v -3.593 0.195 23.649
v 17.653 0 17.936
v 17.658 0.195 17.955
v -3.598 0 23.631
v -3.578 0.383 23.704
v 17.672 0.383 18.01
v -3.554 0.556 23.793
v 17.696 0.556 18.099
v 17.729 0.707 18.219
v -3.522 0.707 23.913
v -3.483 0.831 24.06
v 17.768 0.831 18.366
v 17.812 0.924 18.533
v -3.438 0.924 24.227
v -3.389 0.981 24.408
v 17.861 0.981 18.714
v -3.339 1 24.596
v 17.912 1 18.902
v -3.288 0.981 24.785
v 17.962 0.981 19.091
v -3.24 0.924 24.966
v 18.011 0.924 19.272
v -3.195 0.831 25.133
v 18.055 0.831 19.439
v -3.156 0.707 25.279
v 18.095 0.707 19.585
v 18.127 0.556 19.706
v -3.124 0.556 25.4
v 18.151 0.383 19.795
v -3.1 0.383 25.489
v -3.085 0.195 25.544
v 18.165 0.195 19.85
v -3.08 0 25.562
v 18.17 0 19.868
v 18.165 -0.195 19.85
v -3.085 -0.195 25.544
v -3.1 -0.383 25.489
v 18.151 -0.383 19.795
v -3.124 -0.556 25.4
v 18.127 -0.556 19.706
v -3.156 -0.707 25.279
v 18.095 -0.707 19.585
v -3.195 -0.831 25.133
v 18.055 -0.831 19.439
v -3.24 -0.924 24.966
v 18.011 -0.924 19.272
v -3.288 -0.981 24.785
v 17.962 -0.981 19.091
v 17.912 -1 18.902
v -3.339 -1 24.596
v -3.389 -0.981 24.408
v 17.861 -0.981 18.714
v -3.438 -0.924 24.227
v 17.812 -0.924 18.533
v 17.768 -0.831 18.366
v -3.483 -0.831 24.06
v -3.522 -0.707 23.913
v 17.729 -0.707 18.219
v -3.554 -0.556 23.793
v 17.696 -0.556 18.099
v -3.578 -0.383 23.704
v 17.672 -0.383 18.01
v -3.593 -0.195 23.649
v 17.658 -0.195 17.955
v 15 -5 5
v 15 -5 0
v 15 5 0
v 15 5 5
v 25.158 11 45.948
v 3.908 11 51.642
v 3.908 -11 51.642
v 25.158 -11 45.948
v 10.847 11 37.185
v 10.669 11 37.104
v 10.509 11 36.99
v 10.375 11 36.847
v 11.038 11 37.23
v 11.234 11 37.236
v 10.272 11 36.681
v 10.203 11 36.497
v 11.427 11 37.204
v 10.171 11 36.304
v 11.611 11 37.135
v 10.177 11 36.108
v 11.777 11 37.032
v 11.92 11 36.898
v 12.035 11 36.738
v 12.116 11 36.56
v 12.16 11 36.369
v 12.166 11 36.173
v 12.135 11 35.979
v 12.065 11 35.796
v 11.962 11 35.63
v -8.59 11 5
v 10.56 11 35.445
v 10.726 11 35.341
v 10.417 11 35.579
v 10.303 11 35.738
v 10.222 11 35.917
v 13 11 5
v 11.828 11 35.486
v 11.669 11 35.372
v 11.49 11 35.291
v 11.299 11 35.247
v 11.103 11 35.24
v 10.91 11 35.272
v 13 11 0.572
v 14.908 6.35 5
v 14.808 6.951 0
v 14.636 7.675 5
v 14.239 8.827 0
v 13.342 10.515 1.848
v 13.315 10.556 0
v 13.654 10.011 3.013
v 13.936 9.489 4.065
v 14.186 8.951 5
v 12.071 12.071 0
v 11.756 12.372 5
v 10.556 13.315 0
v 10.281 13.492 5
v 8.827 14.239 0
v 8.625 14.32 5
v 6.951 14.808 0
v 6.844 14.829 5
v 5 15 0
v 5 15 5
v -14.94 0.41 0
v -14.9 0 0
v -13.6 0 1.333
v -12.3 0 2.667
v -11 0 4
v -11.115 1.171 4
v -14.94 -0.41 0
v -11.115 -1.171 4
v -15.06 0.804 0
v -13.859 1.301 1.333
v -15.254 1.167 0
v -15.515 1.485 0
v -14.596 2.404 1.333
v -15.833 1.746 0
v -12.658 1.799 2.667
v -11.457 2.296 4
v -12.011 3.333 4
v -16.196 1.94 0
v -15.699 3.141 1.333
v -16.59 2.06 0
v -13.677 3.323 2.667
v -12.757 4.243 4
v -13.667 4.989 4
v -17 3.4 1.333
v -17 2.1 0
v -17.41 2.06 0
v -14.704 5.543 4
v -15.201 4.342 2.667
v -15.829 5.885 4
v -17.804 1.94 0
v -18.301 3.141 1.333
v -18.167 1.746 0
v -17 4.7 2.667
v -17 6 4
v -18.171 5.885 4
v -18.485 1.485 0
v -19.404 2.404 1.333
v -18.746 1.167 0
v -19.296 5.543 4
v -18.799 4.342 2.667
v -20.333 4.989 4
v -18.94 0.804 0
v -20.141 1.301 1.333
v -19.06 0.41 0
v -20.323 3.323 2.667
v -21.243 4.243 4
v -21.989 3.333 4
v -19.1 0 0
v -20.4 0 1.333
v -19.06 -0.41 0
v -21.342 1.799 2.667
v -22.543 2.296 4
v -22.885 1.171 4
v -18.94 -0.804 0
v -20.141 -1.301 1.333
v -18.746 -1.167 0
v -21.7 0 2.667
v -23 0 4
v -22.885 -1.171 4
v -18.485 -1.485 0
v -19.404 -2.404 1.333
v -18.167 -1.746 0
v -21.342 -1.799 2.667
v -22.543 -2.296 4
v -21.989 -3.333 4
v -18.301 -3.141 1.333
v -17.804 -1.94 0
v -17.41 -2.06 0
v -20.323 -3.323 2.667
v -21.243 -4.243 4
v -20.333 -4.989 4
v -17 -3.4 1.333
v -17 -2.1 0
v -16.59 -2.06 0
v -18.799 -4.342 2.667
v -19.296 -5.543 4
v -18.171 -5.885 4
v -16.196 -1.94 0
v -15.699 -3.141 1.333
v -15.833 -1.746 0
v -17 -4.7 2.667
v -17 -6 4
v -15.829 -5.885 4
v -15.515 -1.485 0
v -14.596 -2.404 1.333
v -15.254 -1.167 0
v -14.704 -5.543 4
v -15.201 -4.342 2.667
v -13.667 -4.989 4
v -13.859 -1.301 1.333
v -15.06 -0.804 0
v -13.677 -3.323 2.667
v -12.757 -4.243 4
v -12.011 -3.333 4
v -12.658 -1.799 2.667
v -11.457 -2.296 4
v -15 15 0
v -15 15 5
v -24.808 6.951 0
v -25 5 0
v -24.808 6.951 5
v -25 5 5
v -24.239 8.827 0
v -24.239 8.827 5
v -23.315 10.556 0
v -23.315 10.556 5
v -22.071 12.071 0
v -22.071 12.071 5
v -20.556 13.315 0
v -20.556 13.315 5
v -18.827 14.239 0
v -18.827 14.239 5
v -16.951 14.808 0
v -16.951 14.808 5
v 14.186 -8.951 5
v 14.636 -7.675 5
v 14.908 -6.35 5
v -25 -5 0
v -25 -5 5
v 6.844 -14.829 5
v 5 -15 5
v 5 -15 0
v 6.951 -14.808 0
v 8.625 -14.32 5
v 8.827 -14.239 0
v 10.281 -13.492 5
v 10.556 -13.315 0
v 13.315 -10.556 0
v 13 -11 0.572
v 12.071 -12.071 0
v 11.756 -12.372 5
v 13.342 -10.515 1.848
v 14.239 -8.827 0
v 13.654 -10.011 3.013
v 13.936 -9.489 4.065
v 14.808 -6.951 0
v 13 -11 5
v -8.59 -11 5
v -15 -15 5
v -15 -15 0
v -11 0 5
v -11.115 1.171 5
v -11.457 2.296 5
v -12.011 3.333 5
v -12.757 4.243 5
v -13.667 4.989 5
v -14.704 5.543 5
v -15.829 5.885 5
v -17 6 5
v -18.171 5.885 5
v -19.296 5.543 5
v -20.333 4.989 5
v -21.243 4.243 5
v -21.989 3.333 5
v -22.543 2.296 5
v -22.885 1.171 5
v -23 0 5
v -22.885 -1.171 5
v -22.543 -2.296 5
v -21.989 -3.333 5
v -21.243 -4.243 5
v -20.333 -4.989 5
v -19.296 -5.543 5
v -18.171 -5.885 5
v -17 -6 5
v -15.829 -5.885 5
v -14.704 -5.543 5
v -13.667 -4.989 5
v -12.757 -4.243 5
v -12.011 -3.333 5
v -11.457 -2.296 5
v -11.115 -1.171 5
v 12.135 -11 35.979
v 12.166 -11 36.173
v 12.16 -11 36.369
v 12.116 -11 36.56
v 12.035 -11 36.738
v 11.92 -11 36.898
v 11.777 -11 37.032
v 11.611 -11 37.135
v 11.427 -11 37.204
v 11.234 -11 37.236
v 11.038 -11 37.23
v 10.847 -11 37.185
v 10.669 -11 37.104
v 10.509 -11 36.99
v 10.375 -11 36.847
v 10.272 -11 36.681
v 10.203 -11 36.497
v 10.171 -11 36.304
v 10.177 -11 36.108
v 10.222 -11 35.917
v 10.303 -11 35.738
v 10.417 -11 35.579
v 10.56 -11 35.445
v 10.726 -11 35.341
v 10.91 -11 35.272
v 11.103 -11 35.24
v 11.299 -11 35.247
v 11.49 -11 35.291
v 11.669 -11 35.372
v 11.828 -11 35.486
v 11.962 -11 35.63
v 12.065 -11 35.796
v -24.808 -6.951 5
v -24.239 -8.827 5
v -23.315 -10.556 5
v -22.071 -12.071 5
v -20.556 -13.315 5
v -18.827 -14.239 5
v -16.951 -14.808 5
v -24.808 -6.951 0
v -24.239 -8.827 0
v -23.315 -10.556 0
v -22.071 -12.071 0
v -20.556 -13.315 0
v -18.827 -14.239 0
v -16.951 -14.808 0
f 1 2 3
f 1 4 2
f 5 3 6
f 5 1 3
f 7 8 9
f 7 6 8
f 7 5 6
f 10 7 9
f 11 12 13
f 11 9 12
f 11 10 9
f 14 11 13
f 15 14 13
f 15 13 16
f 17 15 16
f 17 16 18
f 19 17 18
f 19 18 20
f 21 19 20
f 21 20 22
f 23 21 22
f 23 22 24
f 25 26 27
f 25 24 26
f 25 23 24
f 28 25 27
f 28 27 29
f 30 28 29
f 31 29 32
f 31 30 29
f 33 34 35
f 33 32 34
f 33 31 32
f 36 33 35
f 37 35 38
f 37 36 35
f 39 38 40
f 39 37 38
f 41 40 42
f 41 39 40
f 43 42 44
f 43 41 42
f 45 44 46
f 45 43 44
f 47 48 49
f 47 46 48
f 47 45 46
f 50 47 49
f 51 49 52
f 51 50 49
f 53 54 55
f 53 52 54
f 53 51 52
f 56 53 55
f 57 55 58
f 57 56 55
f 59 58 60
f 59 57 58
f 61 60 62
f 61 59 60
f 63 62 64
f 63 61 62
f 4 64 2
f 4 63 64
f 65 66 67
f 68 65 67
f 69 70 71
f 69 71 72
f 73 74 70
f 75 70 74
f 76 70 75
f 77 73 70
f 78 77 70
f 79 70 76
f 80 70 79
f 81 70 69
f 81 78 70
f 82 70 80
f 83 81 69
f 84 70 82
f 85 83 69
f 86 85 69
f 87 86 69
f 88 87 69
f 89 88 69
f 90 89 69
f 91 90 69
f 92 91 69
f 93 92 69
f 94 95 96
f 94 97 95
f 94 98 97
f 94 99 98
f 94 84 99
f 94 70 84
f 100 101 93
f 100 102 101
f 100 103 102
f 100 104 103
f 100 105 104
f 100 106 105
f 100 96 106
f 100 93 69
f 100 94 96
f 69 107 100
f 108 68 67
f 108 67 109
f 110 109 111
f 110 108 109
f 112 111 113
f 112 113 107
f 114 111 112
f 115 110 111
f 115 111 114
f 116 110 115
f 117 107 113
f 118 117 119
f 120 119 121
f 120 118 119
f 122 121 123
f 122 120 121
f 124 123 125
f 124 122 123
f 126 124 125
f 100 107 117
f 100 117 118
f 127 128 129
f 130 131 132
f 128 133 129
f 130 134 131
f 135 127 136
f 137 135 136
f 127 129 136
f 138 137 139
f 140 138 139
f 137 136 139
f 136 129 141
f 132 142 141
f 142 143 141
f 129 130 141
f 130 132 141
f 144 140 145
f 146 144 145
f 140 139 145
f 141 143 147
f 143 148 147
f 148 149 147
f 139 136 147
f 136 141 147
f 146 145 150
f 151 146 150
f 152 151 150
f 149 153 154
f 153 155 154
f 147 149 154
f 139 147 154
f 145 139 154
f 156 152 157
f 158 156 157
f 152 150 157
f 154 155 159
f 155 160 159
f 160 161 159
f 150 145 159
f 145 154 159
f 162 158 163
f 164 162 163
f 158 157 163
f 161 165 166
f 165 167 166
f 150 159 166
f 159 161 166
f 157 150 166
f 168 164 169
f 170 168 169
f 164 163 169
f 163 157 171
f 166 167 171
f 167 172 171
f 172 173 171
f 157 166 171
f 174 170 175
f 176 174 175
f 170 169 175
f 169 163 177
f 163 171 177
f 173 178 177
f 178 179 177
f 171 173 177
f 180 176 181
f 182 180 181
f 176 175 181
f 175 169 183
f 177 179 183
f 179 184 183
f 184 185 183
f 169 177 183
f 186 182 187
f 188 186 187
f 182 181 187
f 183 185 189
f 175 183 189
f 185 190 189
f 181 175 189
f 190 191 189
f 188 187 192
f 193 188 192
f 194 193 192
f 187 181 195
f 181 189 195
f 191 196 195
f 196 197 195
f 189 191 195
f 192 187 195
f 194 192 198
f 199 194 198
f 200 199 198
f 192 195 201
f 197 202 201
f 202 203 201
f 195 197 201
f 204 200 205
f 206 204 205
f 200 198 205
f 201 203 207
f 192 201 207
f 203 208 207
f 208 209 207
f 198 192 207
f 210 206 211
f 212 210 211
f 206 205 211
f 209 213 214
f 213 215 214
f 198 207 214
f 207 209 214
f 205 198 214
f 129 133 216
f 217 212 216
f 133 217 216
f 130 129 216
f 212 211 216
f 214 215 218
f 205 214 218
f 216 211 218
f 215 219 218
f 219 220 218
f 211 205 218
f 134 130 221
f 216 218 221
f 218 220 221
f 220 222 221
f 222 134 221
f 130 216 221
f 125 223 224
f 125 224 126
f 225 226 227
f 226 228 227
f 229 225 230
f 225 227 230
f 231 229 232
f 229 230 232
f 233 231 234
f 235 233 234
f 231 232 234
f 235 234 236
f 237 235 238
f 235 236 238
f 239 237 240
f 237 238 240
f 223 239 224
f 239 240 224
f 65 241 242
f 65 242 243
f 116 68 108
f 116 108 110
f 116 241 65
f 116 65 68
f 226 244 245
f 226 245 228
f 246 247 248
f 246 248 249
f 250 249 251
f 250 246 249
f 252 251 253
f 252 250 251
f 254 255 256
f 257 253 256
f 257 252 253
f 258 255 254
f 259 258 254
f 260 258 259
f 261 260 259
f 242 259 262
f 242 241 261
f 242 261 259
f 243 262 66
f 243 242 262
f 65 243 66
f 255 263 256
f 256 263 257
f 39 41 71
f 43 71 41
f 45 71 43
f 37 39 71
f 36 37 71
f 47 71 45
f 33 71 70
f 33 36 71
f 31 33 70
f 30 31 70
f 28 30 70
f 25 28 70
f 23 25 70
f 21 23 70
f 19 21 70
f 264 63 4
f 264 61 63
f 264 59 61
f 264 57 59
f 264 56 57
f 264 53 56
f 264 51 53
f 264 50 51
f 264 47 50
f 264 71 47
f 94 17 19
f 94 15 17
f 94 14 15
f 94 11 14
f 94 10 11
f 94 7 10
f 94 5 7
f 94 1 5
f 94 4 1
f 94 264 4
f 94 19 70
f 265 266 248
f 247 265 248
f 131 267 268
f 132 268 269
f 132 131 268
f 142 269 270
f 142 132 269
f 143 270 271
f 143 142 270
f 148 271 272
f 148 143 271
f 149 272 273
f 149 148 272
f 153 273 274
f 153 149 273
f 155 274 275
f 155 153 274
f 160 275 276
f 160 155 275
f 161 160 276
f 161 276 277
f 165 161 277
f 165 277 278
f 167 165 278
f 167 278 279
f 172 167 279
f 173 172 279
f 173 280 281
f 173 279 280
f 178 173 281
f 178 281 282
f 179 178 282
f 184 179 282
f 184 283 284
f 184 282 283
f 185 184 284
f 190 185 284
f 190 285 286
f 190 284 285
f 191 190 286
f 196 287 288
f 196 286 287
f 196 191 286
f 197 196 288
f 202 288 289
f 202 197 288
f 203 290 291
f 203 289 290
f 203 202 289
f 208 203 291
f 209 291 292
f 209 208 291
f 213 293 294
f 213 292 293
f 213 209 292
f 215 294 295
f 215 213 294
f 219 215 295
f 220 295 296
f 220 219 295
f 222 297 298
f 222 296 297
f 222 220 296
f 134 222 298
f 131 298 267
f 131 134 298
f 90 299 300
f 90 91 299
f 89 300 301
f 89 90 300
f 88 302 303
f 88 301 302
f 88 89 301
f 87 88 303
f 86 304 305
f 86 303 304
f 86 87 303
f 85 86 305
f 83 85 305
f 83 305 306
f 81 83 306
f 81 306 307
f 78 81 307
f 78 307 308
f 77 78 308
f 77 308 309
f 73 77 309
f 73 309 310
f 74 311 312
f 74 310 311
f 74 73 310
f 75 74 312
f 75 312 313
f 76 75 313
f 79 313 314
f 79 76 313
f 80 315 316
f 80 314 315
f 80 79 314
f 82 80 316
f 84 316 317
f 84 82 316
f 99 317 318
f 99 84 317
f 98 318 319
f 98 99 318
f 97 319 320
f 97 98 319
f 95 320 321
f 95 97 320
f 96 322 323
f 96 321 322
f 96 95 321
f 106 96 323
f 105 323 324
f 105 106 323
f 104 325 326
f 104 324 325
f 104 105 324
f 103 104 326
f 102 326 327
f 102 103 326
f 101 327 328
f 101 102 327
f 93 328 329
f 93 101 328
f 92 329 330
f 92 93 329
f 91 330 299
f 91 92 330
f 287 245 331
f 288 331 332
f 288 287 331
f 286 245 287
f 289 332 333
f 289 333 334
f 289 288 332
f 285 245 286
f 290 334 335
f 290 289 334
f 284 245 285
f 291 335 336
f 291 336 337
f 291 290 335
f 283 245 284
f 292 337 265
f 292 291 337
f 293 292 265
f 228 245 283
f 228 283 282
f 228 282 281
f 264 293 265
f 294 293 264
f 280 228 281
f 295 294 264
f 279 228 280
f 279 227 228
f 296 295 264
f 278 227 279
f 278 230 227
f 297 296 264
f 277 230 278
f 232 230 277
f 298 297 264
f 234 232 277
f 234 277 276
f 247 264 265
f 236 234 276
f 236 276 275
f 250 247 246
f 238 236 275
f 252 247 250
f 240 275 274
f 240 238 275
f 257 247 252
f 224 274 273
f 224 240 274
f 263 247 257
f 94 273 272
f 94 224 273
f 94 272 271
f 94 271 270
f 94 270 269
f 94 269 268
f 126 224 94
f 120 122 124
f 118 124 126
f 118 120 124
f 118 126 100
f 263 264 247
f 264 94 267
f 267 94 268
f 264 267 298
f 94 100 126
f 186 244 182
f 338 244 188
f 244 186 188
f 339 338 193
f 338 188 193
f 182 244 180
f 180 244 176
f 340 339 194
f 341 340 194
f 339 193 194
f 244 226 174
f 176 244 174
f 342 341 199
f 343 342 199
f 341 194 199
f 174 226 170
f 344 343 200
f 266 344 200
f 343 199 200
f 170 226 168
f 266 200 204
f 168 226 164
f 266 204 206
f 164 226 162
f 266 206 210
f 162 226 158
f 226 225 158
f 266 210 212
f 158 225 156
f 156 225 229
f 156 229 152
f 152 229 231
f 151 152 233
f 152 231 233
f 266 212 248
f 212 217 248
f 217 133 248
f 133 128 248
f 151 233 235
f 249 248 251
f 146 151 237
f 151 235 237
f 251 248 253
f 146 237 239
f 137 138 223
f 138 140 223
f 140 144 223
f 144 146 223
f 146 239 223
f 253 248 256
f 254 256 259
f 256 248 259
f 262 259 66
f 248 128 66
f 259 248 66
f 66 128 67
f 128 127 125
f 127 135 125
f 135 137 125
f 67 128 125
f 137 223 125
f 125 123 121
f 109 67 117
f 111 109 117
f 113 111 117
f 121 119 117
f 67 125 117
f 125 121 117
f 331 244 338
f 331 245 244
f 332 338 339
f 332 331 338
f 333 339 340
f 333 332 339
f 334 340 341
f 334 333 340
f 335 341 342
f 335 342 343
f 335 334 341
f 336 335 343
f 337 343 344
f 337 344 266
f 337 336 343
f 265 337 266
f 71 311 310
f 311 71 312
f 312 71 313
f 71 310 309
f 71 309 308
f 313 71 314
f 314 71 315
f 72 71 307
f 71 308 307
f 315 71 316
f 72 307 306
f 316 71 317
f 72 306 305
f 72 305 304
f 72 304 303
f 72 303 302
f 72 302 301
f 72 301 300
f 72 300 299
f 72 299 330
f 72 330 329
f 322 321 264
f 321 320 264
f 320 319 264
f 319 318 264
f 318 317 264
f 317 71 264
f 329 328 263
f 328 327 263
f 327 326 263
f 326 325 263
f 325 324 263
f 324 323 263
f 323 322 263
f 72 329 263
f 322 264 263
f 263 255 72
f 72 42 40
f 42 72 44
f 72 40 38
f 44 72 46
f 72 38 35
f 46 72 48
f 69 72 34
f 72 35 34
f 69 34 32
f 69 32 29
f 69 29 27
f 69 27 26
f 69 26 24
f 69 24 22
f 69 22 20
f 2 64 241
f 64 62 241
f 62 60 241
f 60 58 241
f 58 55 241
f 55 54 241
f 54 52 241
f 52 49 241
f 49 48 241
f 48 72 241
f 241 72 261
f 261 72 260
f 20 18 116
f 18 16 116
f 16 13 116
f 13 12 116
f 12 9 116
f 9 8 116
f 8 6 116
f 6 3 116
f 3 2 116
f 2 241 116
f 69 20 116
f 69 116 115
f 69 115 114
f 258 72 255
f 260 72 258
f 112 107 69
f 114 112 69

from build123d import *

# Parameters (mm, degrees)
BOX010_W                = 100
BOX010_H                = 100
BOX010_DEPTH            = 20
CYLINDER010_R           = 6
CYLINDER010_DEPTH       = 60
CYLINDER011_R           = 2.1
CYLINDER011_DEPTH       = 40
BOX009_W                = 40
BOX009_H                = 30
BOX009_DEPTH            = 5
FILLET002_R             = 10
CYLINDER013_R           = 1
CYLINDER013_DEPTH       = 60
CYLINDER014_R           = 1
CYLINDER014_DEPTH       = 40
BODY005_PLACEMENT_ANGLE = 90
CYLINDER015_R           = 1
CYLINDER015_DEPTH       = 60
CYLINDER016_R           = 1
CYLINDER016_DEPTH       = 40
BODY006_PLACEMENT_ANGLE = 90
BOX008_W                = 22
BOX008_H                = 22
BOX008_DEPTH            = 50
CUT003_PLACEMENT_ANGLE  = 15


with BuildPart() as base_cube002:
    # Box010 → Box010 (new body)
    with BuildSketch(Plane(origin=(-8, -50, -20), x_dir=(1, 0, 0), z_dir=(0, 0, 1))):
        with Locations((50, 50)):
            Rectangle(BOX010_W, BOX010_H)
    extrude(amount=BOX010_DEPTH)


with BuildPart() as cone005:
    # Cone005 → Cone005 (revolve)
    with BuildSketch(Plane.XZ):
        Polygon((0, 0), (2.1, 0), (6, 4), (0, 4), align=None)
    revolve(axis=Axis((0, 0, 0), (0, 0, 1)))


with BuildPart() as cylinder010:
    # Cylinder010 → Cylinder010 (new body)
    with BuildSketch(Plane.XY.offset(4)):
        Circle(CYLINDER010_R)
    extrude(amount=CYLINDER010_DEPTH)


with BuildPart() as extraction_fusion001:
    # Cylinder011 → Cylinder011 (new body)
    with BuildSketch(Plane.XY.offset(-40)):
        Circle(CYLINDER011_R)
    extrude(amount=CYLINDER011_DEPTH)

    # Fusion012: union Cone005, Cylinder010
    add(cone005.part)
    add(cylinder010.part)


with BuildPart() as extraction_fusion001_1:
    # Fusion012 placement: moved
    add(extraction_fusion001.part.moved(Location((0, 0, 5))))


with BuildPart() as extraction_fusion001_2:
    # Body008 placement: moved
    add(extraction_fusion001_1.part.moved(Location((-17, 0, -5))))

    # Fusion014: union base cube002
    add(base_cube002.part)


with BuildPart() as base_cube_fillet001:
    # Box009 → Box009 (new body)
    with BuildSketch(Plane(origin=(-25, -15, 0), x_dir=(1, 0, 0), z_dir=(0, 0, 1))):
        with Locations((20, 15)):
            Rectangle(BOX009_W, BOX009_H)
    extrude(amount=BOX009_DEPTH)

    # Fillet002
    fillet002_edges = [base_cube_fillet001.edges().sort_by_distance(p)[0] for p in [
        (-25, -15, 2.5),
        (-25, 15, 2.5),
        (15, -15, 2.5),
        (15, 15, 2.5),
    ]]
    fillet(fillet002_edges, radius=FILLET002_R)


with BuildPart() as screw_hole_cylinder001:
    # Cylinder013 → Cylinder013 (new body)
    with BuildSketch(Plane.XY):
        Circle(CYLINDER013_R)
    extrude(amount=CYLINDER013_DEPTH)


with BuildPart() as m3_screw_hole_fusion_clone002:
    # Cylinder014 → Cylinder014 (new body)
    with BuildSketch(Plane.XY.offset(-40)):
        Circle(CYLINDER014_R)
    extrude(amount=CYLINDER014_DEPTH)

    # Fusion011: union screw hole cylinder001
    add(screw_hole_cylinder001.part)


with BuildPart() as m3_screw_hole_fusion_clone002_1:
    # Fusion011 placement: moved
    add(m3_screw_hole_fusion_clone002.part.moved(Location((0, 0, 5))))


with BuildPart() as m3_screw_hole_fusion_clone002_2:
    # Body005 placement: moved
    add(m3_screw_hole_fusion_clone002_1.part.moved(Location((11, 26, 37))).rotate(Axis((11, 26, 37), (1, 0, 0)), BODY005_PLACEMENT_ANGLE))


with BuildPart() as cylinder015:
    # Cylinder015 → Cylinder015 (new body)
    with BuildSketch(Plane.XY):
        Circle(CYLINDER015_R)
    extrude(amount=CYLINDER015_DEPTH)


with BuildPart() as m3_hole_fusion001:
    # Cylinder016 → Cylinder016 (new body)
    with BuildSketch(Plane.XY.offset(-40)):
        Circle(CYLINDER016_R)
    extrude(amount=CYLINDER016_DEPTH)

    # Fusion016: union Cylinder015
    add(cylinder015.part)


with BuildPart() as m3_hole_fusion001_1:
    # Fusion016 placement: moved
    add(m3_hole_fusion001.part.moved(Location((0, 0, 5))))


with BuildPart() as m3_hole_fusion001_2:
    # Body009 placement: moved
    add(m3_hole_fusion001_1.part.moved(Location((0, 0, -5))))


with BuildPart() as m3_hole_fusion001_3:
    # Clone006 placement: moved
    add(m3_hole_fusion001_2.part.moved(Location((0, 0, 10))))


with BuildPart() as m3_hole_fusion001_4:
    # Body006 placement: moved
    add(m3_hole_fusion001_3.part.moved(Location((-2, 11, 22))).rotate(Axis((-2, 11, 22), (0, 1, 0)), BODY006_PLACEMENT_ANGLE))

    # Fusion015: union m3 screw hole fusion clone002
    add(m3_screw_hole_fusion_clone002_2.part)


with BuildPart() as m3_hole_fusion001_5:
    # Fusion015 placement: moved
    add(m3_hole_fusion001_4.part.moved(Location((-7, 0, 0))))


with BuildPart() as stand_cut_v3:
    # Box008 → Box008 (new body)
    with BuildSketch(Plane(origin=(-7, 0, 0), x_dir=(1, 0, 0), z_dir=(0, 0, 1))):
        with Locations((11, 11)):
            Rectangle(BOX008_W, BOX008_H)
    extrude(amount=BOX008_DEPTH)

    # Cut003: cut m3 hole fusion001
    add(m3_hole_fusion001_5.part, mode=Mode.SUBTRACT)


with BuildPart() as stand_cut_v3_1:
    # Cut003 placement: moved
    add(stand_cut_v3.part.moved(Location((-2.27139, -11, 1.53433))).rotate(Axis((-2.27139, -11, 1.53433), (0, 1, 0)), CUT003_PLACEMENT_ANGLE))

    # Fusion013: union base cube fillet001
    add(base_cube_fillet001.part)

    # Cut004: cut extraction fusion001
    add(extraction_fusion001_2.part, mode=Mode.SUBTRACT)


solid = stand_cut_v3_1.part
